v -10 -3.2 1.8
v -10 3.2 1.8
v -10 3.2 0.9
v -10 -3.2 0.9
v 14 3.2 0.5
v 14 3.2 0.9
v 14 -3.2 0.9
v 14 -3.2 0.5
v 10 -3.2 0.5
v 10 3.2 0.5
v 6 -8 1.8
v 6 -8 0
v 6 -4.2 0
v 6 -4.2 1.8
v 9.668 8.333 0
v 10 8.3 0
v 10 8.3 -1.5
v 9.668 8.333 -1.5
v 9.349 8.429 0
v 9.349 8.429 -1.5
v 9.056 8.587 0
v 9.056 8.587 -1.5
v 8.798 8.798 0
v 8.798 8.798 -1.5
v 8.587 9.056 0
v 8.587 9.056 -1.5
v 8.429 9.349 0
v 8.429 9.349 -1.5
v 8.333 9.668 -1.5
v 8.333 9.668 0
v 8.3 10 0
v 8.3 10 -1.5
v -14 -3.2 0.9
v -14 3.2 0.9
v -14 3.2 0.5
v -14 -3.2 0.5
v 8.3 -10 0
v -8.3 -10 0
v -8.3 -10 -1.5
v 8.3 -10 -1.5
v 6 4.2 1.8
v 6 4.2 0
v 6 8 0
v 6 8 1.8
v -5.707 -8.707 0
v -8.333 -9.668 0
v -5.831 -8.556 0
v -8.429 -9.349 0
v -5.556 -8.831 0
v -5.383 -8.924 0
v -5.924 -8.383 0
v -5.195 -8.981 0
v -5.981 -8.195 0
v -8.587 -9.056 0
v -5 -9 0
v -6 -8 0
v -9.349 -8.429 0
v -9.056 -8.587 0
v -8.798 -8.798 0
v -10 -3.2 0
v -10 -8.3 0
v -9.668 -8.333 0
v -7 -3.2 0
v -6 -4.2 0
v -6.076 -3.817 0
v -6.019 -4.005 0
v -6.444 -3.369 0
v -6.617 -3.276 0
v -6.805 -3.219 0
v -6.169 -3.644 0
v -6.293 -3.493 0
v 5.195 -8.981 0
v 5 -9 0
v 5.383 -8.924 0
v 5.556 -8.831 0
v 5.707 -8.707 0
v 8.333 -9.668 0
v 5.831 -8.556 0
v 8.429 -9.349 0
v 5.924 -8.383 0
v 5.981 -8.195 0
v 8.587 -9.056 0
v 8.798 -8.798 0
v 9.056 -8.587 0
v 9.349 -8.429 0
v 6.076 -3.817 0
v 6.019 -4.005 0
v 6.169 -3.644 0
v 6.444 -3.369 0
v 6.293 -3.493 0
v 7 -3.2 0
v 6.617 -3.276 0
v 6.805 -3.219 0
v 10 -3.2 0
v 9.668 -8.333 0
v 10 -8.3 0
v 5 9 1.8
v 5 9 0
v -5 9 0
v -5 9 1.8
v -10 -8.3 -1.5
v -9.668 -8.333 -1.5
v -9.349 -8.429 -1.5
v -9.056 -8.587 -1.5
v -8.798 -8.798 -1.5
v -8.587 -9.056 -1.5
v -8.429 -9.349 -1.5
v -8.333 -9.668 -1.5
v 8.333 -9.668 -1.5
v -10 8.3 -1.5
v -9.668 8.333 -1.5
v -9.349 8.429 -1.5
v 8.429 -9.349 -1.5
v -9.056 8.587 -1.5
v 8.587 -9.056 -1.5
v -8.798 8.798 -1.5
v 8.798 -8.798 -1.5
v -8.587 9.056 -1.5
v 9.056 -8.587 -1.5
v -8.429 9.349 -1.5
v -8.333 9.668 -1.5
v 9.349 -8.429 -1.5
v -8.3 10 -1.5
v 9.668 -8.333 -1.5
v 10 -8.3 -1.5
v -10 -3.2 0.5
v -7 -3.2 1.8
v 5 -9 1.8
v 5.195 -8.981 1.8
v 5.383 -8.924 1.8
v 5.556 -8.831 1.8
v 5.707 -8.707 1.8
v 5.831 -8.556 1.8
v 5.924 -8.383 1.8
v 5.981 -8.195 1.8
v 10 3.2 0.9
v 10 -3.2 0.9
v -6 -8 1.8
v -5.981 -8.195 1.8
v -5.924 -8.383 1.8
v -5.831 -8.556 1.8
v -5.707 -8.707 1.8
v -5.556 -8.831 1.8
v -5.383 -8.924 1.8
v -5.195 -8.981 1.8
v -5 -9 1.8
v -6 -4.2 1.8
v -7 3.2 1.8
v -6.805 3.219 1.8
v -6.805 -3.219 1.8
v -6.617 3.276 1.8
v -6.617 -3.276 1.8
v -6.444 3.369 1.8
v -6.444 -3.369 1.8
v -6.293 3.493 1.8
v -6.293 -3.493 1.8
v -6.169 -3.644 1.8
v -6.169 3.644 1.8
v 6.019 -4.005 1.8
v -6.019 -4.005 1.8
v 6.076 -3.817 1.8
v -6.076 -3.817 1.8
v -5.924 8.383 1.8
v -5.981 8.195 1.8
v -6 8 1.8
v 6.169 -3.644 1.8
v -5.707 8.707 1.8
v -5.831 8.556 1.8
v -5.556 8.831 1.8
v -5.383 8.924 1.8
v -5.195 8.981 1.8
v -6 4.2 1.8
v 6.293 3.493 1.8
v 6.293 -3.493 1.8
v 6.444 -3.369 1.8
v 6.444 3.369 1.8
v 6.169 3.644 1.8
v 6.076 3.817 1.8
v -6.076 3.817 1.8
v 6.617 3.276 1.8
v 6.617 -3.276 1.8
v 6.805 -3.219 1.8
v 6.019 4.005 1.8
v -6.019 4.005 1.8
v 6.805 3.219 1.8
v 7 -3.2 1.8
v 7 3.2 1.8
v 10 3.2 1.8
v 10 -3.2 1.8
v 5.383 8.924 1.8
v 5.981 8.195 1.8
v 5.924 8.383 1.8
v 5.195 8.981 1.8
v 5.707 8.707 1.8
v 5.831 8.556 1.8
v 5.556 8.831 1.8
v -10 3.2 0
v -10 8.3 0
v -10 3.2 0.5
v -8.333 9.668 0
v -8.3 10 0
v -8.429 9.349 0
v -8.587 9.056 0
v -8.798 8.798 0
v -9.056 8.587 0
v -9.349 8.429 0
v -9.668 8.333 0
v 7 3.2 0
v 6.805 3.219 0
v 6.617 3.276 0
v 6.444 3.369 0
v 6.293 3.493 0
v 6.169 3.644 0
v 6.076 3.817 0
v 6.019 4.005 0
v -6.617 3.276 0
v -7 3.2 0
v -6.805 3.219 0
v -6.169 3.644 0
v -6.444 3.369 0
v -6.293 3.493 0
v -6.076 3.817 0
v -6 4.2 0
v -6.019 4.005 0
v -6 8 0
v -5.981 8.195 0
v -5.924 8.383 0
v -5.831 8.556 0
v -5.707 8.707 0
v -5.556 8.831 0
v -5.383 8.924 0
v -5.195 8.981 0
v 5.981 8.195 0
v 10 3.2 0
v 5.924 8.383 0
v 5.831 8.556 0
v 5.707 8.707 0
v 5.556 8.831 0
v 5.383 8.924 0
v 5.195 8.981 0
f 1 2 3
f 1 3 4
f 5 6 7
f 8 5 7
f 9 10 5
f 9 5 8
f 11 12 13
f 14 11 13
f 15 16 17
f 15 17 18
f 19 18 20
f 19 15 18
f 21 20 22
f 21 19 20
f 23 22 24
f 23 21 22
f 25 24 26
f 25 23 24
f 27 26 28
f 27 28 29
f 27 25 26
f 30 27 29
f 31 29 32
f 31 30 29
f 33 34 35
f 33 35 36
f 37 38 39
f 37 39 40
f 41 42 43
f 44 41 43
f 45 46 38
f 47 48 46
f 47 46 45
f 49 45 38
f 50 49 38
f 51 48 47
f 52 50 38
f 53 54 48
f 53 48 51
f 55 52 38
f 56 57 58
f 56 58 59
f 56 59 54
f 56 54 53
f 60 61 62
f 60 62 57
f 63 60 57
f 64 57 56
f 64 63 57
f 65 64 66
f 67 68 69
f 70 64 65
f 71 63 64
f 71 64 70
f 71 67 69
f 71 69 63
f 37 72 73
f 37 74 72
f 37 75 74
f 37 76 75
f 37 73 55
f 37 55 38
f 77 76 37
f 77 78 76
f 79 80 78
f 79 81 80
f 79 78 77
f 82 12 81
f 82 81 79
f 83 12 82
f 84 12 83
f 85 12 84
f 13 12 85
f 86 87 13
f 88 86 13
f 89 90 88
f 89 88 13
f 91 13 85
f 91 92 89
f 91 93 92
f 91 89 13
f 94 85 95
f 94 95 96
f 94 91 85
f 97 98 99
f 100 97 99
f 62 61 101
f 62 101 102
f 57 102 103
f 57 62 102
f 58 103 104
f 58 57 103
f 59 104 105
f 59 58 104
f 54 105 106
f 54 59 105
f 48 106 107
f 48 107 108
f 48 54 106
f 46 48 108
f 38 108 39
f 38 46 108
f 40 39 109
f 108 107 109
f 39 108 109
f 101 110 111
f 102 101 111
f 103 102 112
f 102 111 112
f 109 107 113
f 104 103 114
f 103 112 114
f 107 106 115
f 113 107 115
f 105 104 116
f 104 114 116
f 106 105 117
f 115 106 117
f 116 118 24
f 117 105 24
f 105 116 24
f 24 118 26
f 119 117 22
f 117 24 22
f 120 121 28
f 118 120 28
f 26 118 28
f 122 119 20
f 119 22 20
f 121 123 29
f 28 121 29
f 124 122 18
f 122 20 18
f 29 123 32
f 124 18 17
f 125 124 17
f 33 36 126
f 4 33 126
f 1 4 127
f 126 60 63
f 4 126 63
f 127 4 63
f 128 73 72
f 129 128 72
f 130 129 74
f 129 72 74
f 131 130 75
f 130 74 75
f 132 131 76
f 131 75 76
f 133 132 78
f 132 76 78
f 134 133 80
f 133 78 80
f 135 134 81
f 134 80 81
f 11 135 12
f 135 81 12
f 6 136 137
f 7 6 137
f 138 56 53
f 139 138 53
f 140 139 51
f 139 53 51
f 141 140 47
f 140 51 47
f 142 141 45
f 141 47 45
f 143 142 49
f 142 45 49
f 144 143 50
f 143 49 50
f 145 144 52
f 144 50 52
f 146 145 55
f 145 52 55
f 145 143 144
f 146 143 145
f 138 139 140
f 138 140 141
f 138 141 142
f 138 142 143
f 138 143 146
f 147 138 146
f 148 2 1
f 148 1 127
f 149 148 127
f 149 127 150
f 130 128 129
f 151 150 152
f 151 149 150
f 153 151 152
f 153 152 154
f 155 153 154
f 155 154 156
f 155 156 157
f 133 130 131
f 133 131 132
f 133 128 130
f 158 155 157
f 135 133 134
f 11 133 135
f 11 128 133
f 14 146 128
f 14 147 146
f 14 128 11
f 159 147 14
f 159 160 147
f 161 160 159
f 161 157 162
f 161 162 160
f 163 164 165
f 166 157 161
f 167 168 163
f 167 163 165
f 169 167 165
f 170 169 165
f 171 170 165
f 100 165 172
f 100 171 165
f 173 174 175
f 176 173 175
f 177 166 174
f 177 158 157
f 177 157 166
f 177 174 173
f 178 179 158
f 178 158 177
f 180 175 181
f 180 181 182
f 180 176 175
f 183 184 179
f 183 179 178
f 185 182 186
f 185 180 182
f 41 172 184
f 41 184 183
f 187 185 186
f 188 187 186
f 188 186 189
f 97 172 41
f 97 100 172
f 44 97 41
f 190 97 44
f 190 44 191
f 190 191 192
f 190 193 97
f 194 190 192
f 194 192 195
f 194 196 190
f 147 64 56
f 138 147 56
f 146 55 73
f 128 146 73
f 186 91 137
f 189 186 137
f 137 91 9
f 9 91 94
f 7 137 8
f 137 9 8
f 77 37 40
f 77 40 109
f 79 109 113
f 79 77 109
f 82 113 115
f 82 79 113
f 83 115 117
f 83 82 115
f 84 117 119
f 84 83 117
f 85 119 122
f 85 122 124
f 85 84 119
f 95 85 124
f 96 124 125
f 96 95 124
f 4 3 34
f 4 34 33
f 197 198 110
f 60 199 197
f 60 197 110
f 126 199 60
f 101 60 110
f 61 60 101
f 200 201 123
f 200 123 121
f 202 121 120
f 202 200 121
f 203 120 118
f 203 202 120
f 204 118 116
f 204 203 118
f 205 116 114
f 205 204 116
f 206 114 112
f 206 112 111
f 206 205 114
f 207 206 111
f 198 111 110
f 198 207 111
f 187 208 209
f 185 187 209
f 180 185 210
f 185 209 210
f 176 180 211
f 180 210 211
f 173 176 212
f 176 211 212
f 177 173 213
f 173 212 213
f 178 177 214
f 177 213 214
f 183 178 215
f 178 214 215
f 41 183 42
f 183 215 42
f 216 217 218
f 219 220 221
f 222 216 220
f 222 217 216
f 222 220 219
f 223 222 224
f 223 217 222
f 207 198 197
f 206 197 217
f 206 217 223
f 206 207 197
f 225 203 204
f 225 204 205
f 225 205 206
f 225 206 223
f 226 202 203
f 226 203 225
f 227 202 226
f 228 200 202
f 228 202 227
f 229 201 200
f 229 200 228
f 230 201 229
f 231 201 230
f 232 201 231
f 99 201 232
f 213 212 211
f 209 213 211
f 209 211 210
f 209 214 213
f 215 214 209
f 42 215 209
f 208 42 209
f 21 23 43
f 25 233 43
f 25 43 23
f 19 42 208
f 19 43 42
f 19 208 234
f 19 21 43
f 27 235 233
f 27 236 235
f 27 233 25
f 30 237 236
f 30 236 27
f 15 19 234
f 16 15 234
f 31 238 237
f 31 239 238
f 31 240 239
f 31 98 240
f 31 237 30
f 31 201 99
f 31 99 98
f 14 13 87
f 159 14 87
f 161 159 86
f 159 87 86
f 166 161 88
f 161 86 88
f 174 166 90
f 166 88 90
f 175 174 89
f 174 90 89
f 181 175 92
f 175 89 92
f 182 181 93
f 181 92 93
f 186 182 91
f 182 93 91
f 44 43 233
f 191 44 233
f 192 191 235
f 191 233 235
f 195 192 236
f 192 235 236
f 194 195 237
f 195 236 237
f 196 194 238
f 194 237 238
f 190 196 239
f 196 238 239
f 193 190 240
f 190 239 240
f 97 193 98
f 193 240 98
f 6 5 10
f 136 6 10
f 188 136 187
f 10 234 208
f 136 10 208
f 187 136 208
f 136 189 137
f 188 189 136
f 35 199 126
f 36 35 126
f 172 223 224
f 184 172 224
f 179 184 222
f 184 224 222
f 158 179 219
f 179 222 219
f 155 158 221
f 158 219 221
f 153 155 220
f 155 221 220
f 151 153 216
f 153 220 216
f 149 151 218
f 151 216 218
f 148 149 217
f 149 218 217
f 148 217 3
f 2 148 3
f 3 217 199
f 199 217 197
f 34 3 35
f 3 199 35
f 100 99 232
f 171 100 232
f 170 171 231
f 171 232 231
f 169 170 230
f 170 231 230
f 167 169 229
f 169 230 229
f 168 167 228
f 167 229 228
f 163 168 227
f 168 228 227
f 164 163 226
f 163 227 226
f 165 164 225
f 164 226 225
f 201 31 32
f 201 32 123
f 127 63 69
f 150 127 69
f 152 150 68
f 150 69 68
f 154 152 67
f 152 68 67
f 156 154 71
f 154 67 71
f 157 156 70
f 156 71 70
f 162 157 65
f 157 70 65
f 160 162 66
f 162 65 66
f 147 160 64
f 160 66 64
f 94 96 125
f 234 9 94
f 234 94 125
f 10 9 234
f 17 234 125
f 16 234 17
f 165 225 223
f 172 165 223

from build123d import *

# Parameters (mm, degrees)
F1_DEPTH = 1.5
F3_DEPTH = 1.8
F4_W     = 6.4
F4_H     = 0.4
F5_DEPTH = 4
F6_DEPTH = 24


with BuildPart() as f1:
    # F0 (on Top) → F1 (new body)
    with BuildSketch(Plane.XY):
        with BuildLine():
            Line((-8.3, -10), (8.3, -10))
            ThreePointArc((8.3, -10), (8.797918, -8.797918), (10, -8.3))
            Line((10, -8.3), (10, 8.3))
            ThreePointArc((10, 8.3), (8.797918, 8.797918), (8.3, 10))
            Line((8.3, 10), (-8.3, 10))
            ThreePointArc((-8.3, 10), (-8.797918, 8.797918), (-10, 8.3))
            Line((-10, 8.3), (-10, -8.3))
            ThreePointArc((-10, -8.3), (-8.797918, -8.797918), (-8.3, -10))
        make_face()
    extrude(amount=-F1_DEPTH)

    # F2 (on face) → F3 (join)
    with BuildSketch(Plane.XY):
        with BuildLine():
            Line((-5, -9), (5, -9))
            ThreePointArc((5, -9), (5.707107, -8.707107), (6, -8))
            Line((6, -8), (6, -4.2))
            ThreePointArc((6, -4.2), (6.292893, -3.492893), (7, -3.2))
            Line((7, -3.2), (10, -3.2))
            Line((10, -3.2), (10, 3.2))
            Line((10, 3.2), (7, 3.2))
            ThreePointArc((7, 3.2), (6.292893, 3.492893), (6, 4.2))
            Line((6, 4.2), (6, 8))
            ThreePointArc((6, 8), (5.707107, 8.707107), (5, 9))
            Line((5, 9), (-5, 9))
            ThreePointArc((-5, 9), (-5.707107, 8.707107), (-6, 8))
            Line((-6, 8), (-6, 4.2))
            ThreePointArc((-6, 4.2), (-6.292893, 3.492893), (-7, 3.2))
            Line((-7, 3.2), (-10, 3.2))
            Line((-10, 3.2), (-10, -3.2))
            Line((-10, -3.2), (-7, -3.2))
            ThreePointArc((-7, -3.2), (-6.292893, -3.492893), (-6, -4.2))
            Line((-6, -4.2), (-6, -8))
            ThreePointArc((-6, -8), (-5.707107, -8.707107), (-5, -9))
        make_face()
    extrude(amount=F3_DEPTH)

    # F4 (on face) → F5 (join)
    with BuildSketch(Plane(origin=(-10, 0, 0), x_dir=(0, -1, 0), z_dir=(-1, 0, 0))):
        with Locations((0, 0.7)):
            Rectangle(F4_W, F4_H)
    extrude(amount=F5_DEPTH)

    # F4 (on face) → F6 (join)
    with BuildSketch(Plane(origin=(-10, 0, 0), x_dir=(0, -1, 0), z_dir=(-1, 0, 0))):
        with Locations((0, 0.7)):
            Rectangle(F4_W, F4_H)
    extrude(amount=-F6_DEPTH)


solid = f1.part
